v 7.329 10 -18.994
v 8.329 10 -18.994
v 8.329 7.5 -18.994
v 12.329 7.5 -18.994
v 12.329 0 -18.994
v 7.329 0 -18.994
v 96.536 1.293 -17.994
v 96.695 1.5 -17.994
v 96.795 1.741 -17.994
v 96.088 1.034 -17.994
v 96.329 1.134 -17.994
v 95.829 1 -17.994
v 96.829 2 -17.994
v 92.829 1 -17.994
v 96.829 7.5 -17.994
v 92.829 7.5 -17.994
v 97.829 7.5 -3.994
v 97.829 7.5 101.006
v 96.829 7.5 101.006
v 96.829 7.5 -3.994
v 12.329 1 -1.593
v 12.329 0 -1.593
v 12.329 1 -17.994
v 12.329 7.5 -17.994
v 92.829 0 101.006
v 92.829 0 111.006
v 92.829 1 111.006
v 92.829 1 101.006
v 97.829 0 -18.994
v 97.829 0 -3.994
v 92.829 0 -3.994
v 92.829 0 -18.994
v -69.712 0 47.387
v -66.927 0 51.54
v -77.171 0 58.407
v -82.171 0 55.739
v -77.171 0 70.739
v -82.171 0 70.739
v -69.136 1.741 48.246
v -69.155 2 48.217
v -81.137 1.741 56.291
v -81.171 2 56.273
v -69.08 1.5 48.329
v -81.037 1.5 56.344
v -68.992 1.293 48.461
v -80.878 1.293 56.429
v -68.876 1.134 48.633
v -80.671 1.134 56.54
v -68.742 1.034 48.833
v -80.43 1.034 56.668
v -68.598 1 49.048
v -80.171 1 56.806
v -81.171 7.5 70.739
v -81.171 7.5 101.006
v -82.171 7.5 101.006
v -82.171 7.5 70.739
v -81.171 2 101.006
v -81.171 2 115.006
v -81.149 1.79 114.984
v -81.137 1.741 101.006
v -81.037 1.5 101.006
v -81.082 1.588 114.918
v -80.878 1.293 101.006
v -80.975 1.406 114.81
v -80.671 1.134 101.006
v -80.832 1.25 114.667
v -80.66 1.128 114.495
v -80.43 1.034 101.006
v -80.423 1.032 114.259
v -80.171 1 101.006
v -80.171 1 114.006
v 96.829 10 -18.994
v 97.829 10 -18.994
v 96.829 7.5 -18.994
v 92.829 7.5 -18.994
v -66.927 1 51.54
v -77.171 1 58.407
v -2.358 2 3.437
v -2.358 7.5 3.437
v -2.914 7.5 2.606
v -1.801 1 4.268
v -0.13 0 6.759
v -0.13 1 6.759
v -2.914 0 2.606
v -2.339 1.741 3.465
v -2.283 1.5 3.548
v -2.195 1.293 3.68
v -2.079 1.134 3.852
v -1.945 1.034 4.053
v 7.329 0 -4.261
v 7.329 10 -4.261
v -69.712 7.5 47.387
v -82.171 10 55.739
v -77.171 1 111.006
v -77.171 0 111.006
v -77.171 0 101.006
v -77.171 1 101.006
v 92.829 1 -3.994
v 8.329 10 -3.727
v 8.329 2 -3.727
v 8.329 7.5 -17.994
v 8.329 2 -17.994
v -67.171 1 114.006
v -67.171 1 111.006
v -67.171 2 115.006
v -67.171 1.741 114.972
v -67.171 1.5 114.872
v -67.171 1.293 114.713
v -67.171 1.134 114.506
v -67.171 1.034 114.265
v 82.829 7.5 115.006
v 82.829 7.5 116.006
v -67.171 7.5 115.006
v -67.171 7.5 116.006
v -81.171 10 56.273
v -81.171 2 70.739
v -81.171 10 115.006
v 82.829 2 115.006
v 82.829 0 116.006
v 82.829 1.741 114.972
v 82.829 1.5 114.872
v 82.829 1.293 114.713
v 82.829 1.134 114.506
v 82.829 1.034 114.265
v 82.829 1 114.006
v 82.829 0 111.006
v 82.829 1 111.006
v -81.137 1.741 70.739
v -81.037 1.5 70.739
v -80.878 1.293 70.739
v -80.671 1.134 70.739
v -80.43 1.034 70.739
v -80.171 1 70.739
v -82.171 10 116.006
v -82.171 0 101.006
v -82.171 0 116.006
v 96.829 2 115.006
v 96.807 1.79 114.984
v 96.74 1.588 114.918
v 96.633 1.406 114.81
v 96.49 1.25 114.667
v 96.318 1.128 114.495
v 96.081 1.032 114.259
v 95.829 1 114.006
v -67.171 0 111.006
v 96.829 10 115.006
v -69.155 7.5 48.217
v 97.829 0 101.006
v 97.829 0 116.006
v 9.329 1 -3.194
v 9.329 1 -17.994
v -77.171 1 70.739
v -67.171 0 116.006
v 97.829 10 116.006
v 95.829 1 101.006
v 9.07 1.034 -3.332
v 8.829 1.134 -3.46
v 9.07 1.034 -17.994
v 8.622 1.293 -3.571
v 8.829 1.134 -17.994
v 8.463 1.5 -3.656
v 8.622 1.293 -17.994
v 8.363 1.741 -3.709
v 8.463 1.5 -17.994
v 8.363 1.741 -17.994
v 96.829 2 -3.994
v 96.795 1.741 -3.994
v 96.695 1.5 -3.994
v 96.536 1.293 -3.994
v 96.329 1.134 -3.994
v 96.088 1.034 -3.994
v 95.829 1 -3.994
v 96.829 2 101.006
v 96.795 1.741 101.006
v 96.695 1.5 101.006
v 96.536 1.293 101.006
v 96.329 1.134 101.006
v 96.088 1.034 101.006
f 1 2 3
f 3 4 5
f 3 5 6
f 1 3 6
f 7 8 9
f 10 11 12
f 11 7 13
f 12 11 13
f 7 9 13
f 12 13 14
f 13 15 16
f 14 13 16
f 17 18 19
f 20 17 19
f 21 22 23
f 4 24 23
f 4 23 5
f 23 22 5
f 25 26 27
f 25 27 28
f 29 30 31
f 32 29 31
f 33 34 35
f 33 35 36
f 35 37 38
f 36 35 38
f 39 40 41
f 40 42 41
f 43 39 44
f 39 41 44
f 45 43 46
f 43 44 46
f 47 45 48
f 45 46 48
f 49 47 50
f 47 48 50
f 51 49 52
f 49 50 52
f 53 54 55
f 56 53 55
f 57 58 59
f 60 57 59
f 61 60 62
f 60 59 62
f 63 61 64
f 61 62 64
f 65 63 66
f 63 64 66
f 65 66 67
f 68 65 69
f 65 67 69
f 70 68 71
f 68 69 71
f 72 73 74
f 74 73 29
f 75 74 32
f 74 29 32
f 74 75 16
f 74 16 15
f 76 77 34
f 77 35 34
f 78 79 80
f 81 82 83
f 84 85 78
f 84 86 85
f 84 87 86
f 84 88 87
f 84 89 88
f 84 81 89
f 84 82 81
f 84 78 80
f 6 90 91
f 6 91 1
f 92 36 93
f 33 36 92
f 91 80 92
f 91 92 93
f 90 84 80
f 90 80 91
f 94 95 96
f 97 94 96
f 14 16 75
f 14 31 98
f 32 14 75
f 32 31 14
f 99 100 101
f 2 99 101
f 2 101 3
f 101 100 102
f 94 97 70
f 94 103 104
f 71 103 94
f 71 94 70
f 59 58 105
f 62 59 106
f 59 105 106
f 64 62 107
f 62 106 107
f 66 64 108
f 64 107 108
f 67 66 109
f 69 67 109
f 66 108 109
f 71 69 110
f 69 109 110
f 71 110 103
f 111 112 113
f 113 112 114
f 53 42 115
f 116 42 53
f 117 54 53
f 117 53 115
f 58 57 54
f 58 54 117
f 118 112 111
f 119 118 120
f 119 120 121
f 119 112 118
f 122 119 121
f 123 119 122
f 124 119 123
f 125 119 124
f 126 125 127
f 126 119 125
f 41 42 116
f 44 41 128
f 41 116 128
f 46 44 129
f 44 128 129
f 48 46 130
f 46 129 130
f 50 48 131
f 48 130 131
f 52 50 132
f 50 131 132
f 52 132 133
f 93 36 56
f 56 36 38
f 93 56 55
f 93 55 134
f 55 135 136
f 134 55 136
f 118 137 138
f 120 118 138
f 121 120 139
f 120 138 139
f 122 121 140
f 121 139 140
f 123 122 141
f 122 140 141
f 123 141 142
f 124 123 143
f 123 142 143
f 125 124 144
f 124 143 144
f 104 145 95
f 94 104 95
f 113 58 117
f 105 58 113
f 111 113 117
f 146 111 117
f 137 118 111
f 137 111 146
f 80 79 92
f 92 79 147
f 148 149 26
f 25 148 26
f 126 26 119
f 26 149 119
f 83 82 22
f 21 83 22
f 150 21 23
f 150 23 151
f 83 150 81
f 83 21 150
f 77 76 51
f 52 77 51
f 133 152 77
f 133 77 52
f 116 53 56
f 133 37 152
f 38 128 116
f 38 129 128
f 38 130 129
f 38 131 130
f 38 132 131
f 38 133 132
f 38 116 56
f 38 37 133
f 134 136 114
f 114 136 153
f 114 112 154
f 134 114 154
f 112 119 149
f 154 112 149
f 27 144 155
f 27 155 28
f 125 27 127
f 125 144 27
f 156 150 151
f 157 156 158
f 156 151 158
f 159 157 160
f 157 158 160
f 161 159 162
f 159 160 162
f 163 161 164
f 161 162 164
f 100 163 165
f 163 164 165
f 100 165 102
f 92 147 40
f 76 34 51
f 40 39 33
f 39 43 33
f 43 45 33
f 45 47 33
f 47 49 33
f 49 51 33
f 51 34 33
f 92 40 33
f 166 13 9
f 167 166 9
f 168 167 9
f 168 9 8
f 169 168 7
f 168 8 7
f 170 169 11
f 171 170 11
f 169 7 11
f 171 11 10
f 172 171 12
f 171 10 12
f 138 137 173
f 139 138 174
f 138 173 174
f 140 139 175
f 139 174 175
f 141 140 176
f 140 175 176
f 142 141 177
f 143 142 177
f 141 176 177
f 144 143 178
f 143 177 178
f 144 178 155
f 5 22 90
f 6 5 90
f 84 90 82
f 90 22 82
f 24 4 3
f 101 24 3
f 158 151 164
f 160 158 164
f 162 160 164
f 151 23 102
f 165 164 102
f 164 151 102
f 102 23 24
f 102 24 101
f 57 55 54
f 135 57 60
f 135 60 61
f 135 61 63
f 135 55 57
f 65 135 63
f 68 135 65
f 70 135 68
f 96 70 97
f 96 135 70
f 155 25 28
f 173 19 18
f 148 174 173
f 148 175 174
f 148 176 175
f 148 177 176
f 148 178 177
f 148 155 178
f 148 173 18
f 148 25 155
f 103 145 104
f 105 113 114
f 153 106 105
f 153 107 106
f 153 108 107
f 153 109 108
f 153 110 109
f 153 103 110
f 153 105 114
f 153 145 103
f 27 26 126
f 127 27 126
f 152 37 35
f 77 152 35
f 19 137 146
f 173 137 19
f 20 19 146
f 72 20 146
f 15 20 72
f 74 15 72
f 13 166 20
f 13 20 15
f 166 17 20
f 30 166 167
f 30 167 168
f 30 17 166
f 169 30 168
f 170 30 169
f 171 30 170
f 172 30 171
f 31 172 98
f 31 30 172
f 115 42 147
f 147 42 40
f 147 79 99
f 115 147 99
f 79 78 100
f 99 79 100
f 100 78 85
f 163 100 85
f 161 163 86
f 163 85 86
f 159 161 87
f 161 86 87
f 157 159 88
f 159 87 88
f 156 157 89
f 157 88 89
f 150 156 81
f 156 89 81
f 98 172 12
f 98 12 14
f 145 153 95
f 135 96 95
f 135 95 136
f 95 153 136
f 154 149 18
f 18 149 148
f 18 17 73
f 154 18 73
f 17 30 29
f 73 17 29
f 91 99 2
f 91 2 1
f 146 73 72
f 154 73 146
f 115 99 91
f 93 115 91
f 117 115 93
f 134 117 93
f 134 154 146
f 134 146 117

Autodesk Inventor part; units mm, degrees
ref_plane "YZ Plane" through (0, 0, 0) normal (1, 0, 0) x (0, 1, 0)
ref_plane "XZ Plane" through (0, 0, 0) normal (0, 1, 0) x (-1, 0, 0)
ref_plane "XY Plane" through (0, 0, 0) normal (0, 0, 1) x (1, 0, 0)
sketch "Sketch1" plane through (0, 0, 0) normal (0, 1, 0) x (-1, 0, 0)
  line L0 (82.171, 116.0061) -> (-97.829, 116.0061)
  line L1 (-97.829, 116.0061) -> (-97.829, -153.9939)
  line L2 (-97.829, -153.9939) -> (82.171, -153.9939)
  line L3 (81.171, 115.0061) -> (-96.829, 115.0061)
  line L4 (-96.829, 115.0061) -> (-96.829, -152.9939)
  line L5 (-96.829, -152.9939) -> (81.171, -152.9939)
  line L6 (81.171, 56.2728) -> (-8.329, -3.7272)
  line L7 (82.171, 55.7393) -> (-7.329, -4.2607)
  line L8 (82.171, -93.7272) -> (-7.329, -33.7272)
  line L9 (81.171, -94.2607) -> (-8.329, -34.2607)
  line L10 (81.171, 56.2728) -> (81.171, 115.0061)
  line L11 (82.171, -153.9939) -> (82.171, -93.7272)
  line L12 (82.171, 55.7393) -> (82.171, 116.0061)
  line L13 (-7.329, -4.2607) -> (-7.329, -33.7272)
  line L14 (-8.329, -3.7272) -> (-8.329, -34.2607)
  line L15 (81.171, -152.9939) -> (81.171, -94.2607)
  line L16 (-92.829, 111.0061) -> (77.171, 111.0061)
  line L17 (-92.829, 111.0061) -> (-92.829, -148.9939)
  line L18 (-92.829, -148.9939) -> (77.171, -148.9939)
  line L19 (-12.329, -1.5931) -> (-12.329, -36.3948)
  line L20 (77.171, 58.4069) -> (-12.329, -1.5931)
  line L21 (77.171, 111.0061) -> (77.171, 58.4069)
  line L22 (77.171, -96.3948) -> (77.171, -148.9939)
  line L23 (77.171, -96.3948) -> (-12.329, -36.3948)
  line L24 (67.171, 133.2815) -> (-82.829, 133.2815)
  line L25 (-82.829, 133.2815) -> (-82.829, 85.6394)
  line L26 (-82.829, 85.6394) -> (67.171, 85.6394)
  line L27 (67.171, 85.6394) -> (67.171, 133.2815)
  line L28 (91.8793, 101.0061) -> (59.7353, 101.0061)
  line L29 (59.7353, 101.0061) -> (59.7353, 70.7393)
  line L30 (59.7353, 70.7393) -> (91.8793, 70.7393)
  line L31 (91.8793, 70.7393) -> (91.8793, 101.0061)
  line L32 (74.0374, 40.9341) -> (7.2402, -3.8462)
  line L33 (56.8116, 66.6293) -> (-9.9856, 21.8491)
  line L34 (56.8116, 66.6293) -> (74.0374, 40.9341)
  line L35 (-9.9856, 21.8491) -> (7.2402, -3.8462)
  line L36 (-88.3298, 101.0061) -> (-103.1355, 101.0061)
  line L37 (-103.1355, 101.0061) -> (-103.1355, -3.9939)
  line L38 (-103.1355, -3.9939) -> (-88.3298, -3.9939)
  line L39 (-88.3298, -3.9939) -> (-88.3298, 101.0061)
  line L40 (-12.329, -18.9939) -> (-92.829, -18.9939)
  line L41 (67.171, -171.2694) -> (-82.829, -171.2694)
  line L42 (-82.829, -171.2694) -> (-82.829, -123.6273)
  line L43 (-82.829, -123.6273) -> (67.171, -123.6273)
  line L44 (67.171, -123.6273) -> (67.171, -171.2694)
  line L45 (91.8793, -138.9939) -> (59.7353, -138.9939)
  line L46 (59.7353, -138.9939) -> (59.7353, -108.7272)
  line L47 (59.7353, -108.7272) -> (91.8793, -108.7272)
  line L48 (91.8793, -108.7272) -> (91.8793, -138.9939)
  line L49 (74.0374, -78.922) -> (7.2402, -34.1417)
  line L50 (56.8116, -104.6172) -> (-9.9856, -59.837)
  line L51 (56.8116, -104.6172) -> (74.0374, -78.922)
  line L52 (-9.9856, -59.837) -> (7.2402, -34.1417)
  line L53 (-88.3298, -138.9939) -> (-103.1355, -138.9939)
  line L54 (-103.1355, -138.9939) -> (-103.1355, -33.9939)
  line L55 (-103.1355, -33.9939) -> (-88.3298, -33.9939)
  line L56 (-88.3298, -33.9939) -> (-88.3298, -138.9939)
  line L57 (79.671, -206.4141) -> (79.671, 178.4349)
  point P0 (0, 0)
  dimension "d0" = 270
  dimension "d3" = 1
  dimension "d4" = 1
  dimension "d5" = 1
  dimension "d17" = 5
  dimension "d18" = 29.4665
  dimension "d28" = 1
  dimension "d29" = 5
  dimension "d30" = 5
  dimension "d31" = 1
  dimension "d32" = 15
  dimension "d33" = 15
  dimension "d34" = 15
  dimension "d35" = 15
  dimension "d36" = 15
  dimension "d37" = 15
  dimension "d38" = 15
  dimension "d39" = 135
  dimension "d40" = 15
  dimension "d41" = 5
  dimension "d42" = 5
  dimension "d48" = 2.5
extrude "Extrusion1" add sketch "Sketch1" along normal blind 10 contours L12 L28 L10 L3 L57 L0 | L57 L3 L27 L0 | L12 L30 L10 L28 | L27 L3 L25 L0 | L12 L7 L57 L6 L10 L30 | L25 L3 L4 L36 L1 L0 | L7 L34 L6 L57 | L36 L4 L38 L1 | L7 L35 L6 L34 | L57 L9 L51 L8 | L8 L11 L47 L15 L9 L57 | L38 L4 L55 L1 | L7 L13 L8 L52 L9 L14 L6 L35 | L51 L9 L52 L8 | L55 L4 L53 L1 | L11 L45 L15 L47 | L53 L4 L5 L42 L2 L1 | L11 L2 L57 L5 L15 L45 | L57 L2 L44 L5 | L42 L5 L44 L2
extrude "Extrusion2" add sketch "Sketch1" along normal blind 1 contours L57 L28 L21 L16 L27 L3 | L3 L10 L28 L57 | L10 L30 L57 L28 | L27 L16 L25 L3 | L57 L30 L21 L28 | L10 L6 L57 L30 | L25 L16 L17 L36 L4 L3 | L57 L6 L34 L20 L21 L30 | L36 L17 L38 L4 | L6 L35 L20 L34 | L57 L47 L22 L23 L51 L9 | L9 L15 L47 L57 | L38 L17 L55 L4 | L6 L14 L9 L52 L23 L19 L20 L35 | L51 L23 L52 L9 | L57 L45 L22 L47 | L47 L15 L45 L57 | L55 L17 L53 L4 | L57 L5 L44 L18 L22 L45 | L45 L15 L5 L57 | L53 L17 L18 L42 L5 L4 | L5 L42 L18 L44
extrude "Extrusion3" cut sketch "Sketch1" along normal blind 7.5 contours L28 L31 L30 L12 | L12 L30 L10 L28 | L27 L3 L25 L0 | L0 L25 L24 L27 | L10 L30 L57 L28 | L27 L16 L25 L3 | L57 L30 L21 L28 | L27 L28 L29 L26 L25 L16 | L21 L30 L29 L26 L27 L28 | L36 L4 L38 L1 | L1 L38 L37 L36 | L27 L26 L29 L28 | L34 L32 L35 L7 | L7 L35 L6 L34 | L36 L17 L38 L4 | L6 L35 L20 L34 | L51 L9 L52 L8 | L8 L52 L49 L51 | L55 L4 L53 L1 | L1 L53 L54 L55 | L36 L39 L38 L17 | L20 L35 L33 L34 | L47 L48 L45 L11 | L11 L45 L15 L47 | L51 L23 L52 L9 | L57 L45 L22 L47 | L47 L15 L45 L57 | L55 L17 L53 L4 | L51 L50 L52 L23 | L22 L45 L44 L43 L46 L47 | L55 L56 L53 L17 | L42 L5 L44 L2 | L2 L44 L41 L42 | L45 L46 L43 L44 | L44 L18 L42 L43 L46 L45 | L5 L42 L18 L44
fillet "Fillet1" radius 1 15 edges at (2.9857, 1, -0.1451) (8.329, 1, -18.9939) (-81.171, 1, -101.4939) (-74.171, 1, -152.9939) (-81.171, 1, -145.9939) (-75.1629, 1, 52.2451) (-81.171, 1, 63.5061) (-81.171, 1, 108.0061) (-74.171, 1, 115.0061) (89.829, 1, 115.0061) (96.829, 1, 108.0061) (96.829, 1, -18.9939) (96.829, 1, -145.9939) (2.9857, 1, -37.8428) (89.829, 1, -152.9939)
sketch "Sketch2" plane through (0, 0, 0) normal (0, -1, 0) x (1, 0, 0)
  line L0 (135.8296, -18.9939) -> (-115.0378, -18.9939)
  line L1 (-115.0378, -18.9939) -> (-115.0378, 152.8468)
  line L2 (-115.0378, 152.8468) -> (135.8296, 152.8468)
  line L3 (135.8296, 152.8468) -> (135.8296, -18.9939)
  line L4 (-115.0378, -18.9939) -> (154.388, -18.9939)
  line L5 (154.388, -18.9939) -> (154.388, -183.4288)
  line L6 (154.388, -183.4288) -> (-115.0378, -183.4288)
  line L7 (-115.0378, -183.4288) -> (-115.0378, -18.9939)
  point P0 (0, 0)
extrude "Extrusion4" cut sketch "Sketch2" against normal blind 100 contours L0 L1 L2 L3 keep common part
sketch "Sketch4" plane through (97.829, 0, -18.9939) normal (0, 0, -1) x (-1, 0, 0)
  line L0 (0, 0) -> (5, 0)
  line L1 (5, 0) -> (5, 7.5)
  line L2 (5, 7.5) -> (0, 7.5)
  line L3 (0, 7.5) -> (0, 0)
  line L4 (90.5, 0) -> (85.5, 0)
  line L5 (85.5, 0) -> (85.5, 7.5)
  line L6 (85.5, 7.5) -> (90.5, 7.5)
  line L7 (90.5, 7.5) -> (90.5, 0)
  point P0 (97.829, 0)
  dimension "d55" = 5
  dimension "d56" = 5
  dimension "d57" = 7.5
  dimension "d58" = 7.5
extrude "Extrusion6" add sketch "Sketch4" against normal blind 1
properties part number "Female"
